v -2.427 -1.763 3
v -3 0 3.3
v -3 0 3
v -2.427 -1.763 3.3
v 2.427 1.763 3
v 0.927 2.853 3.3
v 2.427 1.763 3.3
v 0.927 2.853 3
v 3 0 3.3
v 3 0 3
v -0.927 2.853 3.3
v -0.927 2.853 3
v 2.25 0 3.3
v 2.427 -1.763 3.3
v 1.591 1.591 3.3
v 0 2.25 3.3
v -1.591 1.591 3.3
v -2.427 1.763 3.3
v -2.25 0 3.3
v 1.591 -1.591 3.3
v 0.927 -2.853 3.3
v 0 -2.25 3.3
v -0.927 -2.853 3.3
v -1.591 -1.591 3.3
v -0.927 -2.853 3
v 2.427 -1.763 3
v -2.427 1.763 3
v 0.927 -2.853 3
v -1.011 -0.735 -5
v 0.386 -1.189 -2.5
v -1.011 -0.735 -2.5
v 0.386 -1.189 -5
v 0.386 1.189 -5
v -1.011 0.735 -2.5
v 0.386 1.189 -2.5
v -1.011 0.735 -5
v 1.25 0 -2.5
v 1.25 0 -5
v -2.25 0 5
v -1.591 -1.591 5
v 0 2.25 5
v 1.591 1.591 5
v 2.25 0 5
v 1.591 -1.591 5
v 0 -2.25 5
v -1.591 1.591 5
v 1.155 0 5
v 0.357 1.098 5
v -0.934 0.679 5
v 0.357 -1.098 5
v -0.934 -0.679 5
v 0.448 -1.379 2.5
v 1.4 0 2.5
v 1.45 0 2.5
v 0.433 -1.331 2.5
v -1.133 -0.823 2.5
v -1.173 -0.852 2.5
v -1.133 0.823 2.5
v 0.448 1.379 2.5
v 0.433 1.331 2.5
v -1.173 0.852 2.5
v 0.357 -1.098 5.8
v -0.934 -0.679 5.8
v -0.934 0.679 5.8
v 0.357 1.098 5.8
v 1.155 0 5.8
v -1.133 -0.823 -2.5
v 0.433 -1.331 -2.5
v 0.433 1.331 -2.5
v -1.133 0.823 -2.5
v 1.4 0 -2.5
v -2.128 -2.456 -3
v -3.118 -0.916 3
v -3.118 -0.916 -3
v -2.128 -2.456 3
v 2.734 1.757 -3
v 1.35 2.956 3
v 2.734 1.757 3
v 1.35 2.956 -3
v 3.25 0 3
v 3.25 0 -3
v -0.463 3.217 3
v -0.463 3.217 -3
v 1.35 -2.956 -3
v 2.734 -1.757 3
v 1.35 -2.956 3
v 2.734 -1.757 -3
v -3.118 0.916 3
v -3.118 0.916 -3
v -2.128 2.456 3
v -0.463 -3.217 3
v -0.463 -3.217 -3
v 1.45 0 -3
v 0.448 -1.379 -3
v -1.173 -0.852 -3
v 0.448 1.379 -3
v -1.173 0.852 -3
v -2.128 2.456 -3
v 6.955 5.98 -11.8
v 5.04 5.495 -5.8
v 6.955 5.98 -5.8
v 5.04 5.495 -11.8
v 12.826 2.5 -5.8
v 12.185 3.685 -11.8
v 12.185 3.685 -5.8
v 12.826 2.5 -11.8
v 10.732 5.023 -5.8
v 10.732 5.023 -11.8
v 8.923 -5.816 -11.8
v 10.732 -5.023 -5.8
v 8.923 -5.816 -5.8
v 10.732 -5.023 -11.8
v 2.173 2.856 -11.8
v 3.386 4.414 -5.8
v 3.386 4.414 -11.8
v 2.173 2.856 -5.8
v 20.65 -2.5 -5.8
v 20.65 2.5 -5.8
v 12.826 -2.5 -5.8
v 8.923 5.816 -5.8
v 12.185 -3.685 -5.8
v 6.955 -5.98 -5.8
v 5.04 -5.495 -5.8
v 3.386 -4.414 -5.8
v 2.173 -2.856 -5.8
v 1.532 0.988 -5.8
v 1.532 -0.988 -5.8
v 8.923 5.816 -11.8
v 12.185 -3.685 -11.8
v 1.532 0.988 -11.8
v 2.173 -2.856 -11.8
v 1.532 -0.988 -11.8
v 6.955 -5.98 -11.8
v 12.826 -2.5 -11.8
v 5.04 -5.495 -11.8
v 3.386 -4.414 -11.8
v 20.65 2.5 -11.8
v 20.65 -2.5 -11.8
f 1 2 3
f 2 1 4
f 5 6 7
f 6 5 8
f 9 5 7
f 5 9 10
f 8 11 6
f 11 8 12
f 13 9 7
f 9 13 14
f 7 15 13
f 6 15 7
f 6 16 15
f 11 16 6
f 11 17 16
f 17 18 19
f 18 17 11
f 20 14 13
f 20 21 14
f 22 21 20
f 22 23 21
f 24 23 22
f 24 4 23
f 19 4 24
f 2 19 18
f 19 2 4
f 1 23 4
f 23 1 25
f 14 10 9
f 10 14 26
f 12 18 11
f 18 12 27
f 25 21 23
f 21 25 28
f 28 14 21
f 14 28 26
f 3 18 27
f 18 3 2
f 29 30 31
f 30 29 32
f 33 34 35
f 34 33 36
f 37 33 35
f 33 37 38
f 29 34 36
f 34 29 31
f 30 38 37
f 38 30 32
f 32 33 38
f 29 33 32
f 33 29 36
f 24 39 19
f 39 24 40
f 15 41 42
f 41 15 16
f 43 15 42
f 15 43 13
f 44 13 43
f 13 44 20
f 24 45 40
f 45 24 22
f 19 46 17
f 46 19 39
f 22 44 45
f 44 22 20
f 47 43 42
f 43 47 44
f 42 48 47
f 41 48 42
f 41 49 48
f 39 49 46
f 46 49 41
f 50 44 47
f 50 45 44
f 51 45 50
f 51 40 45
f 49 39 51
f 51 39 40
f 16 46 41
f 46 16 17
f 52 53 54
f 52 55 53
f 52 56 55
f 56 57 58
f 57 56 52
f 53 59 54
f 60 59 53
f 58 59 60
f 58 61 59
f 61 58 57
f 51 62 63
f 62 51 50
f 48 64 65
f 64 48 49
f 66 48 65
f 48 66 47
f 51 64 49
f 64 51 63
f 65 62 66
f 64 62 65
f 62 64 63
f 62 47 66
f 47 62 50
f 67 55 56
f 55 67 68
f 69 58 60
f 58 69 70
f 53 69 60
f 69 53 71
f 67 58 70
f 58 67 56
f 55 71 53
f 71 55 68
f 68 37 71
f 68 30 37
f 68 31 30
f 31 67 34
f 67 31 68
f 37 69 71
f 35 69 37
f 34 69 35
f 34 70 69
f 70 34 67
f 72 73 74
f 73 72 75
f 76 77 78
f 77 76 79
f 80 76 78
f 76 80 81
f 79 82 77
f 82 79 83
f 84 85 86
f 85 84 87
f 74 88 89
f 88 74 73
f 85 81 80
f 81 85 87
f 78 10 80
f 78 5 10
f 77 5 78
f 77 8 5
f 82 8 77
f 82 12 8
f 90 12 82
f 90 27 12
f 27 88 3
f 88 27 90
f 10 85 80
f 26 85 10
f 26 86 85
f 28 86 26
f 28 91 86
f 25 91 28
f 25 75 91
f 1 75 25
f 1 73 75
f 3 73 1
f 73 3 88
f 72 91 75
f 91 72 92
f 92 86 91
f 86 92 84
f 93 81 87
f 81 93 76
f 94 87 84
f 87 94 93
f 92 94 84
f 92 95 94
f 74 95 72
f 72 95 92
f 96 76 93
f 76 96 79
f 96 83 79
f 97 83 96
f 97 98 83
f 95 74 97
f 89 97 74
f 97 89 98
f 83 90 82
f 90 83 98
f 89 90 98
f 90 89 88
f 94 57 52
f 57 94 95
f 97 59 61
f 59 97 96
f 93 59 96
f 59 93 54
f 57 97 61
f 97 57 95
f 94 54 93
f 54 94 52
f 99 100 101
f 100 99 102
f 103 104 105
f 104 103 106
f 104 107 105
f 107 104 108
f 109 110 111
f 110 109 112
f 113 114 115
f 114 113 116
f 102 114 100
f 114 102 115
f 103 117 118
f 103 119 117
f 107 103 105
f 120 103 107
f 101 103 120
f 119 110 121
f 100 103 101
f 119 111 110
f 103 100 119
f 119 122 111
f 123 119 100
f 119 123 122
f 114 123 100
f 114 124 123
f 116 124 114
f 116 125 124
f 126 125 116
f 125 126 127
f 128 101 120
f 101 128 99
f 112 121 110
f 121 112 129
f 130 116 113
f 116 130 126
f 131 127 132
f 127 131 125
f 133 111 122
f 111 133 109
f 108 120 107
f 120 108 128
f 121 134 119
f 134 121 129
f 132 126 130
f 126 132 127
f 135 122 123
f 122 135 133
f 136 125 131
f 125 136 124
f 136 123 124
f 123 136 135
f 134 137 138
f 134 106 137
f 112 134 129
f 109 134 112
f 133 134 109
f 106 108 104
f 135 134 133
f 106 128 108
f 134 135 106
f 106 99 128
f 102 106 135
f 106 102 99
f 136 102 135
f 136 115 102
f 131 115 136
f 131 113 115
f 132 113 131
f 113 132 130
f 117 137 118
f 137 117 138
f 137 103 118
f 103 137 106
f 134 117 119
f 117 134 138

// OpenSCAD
// Parameters
shank_diameter_mm = 2.5; //[1.25:5:0.1]
length_mm = 10; //[5:20:0.5]
head_diameter_mm = 4.5; //[2.25:9:0.1]
head_height_mm = 2.5; //[1.25:5:0.1]
overlap_mm = 0.8; //[0.5:2:0.1]
threaded = 1; //[0:1:1]
thread_pitch_mm = 0.45; //[0.25:1:0.05]
thread_depth_mm = 0.15; //[0.05:0.4:0.01]
thread_length_mm = 7; //[3.5:14:0.5]
socket_across_flats_mm = 2; //[1:4:0.1]
socket_depth_mm = 1.5; //[0.75:3:0.1]
washer_outer_diameter_mm = 6; //[3:12:0.1]
washer_thickness_mm = 0.8; //[0.4:1.6:0.1]
washer_hole_diameter_mm = 2.8; //[1.4:5.6:0.1]
pcb_spacer_height_mm = 6; //[3:12:0.5]
pcb_spacer_wall_mm = 1.8; //[0.9:3.6:0.1]
pcb_spacer_clearance_diameter_mm = 2.9; //[1.5:6:0.1]
buzzer_diameter_mm = 12; //[6:24:0.5]
buzzer_height_mm = 6; //[3:12:0.5]
pin_socket_width_mm = 8; //[4:16:0.5]
pin_socket_depth_mm = 5; //[2.5:10:0.5]
pin_socket_height_mm = 6; //[3:12:0.5]

// PCB Spacer - complete geometry
module pcb_spacer() {
  color([0.85, 0.85, 0.8]) {
    difference() {
      cylinder(r=pcb_spacer_clearance_diameter_mm/2 + pcb_spacer_wall_mm, h=pcb_spacer_height_mm, center=true);
      translate([0, 0, -overlap_mm])
        cylinder(r=pcb_spacer_clearance_diameter_mm/2, h=pcb_spacer_height_mm + 2*overlap_mm, center=true);
    }
  }
}

// Screw and Washer - complete geometry
module screw_and_washer() {
  color("DimGray") {
    union() {
      // Screw Shank
      translate([0, 0, -head_height_mm/2])
        cylinder(r=shank_diameter_mm/2, h=length_mm - head_height_mm, center=true);
      // Cap Head
      translate([0, 0, length_mm/2 - head_height_mm/2])
        cylinder(r=head_diameter_mm/2, h=head_height_mm, center=true);
      // Hex Socket Recess
      translate([0, 0, length_mm/2 - socket_depth_mm/2 + overlap_mm])
        difference() {
          cylinder(r=(socket_across_flats_mm/2)/cos(30), h=socket_depth_mm, center=true);
        }
      // Thread Representation
      if (threaded) {
        translate([0, 0, -length_mm/2 + head_height_mm + thread_length_mm/2])
          cylinder(r=shank_diameter_mm/2 + thread_depth_mm, h=thread_length_mm, center=true);
      }
      // Washer
      translate([0, 0, length_mm/2 - head_height_mm - washer_thickness_mm/2 + overlap_mm])
        difference() {
          cylinder(r=washer_outer_diameter_mm/2, h=washer_thickness_mm, center=true);
          translate([0, 0, -overlap_mm])
            cylinder(r=washer_hole_diameter_mm/2, h=washer_thickness_mm + 2*overlap_mm, center=true);
        }
    }
  }
}

// Buzzer - complete geometry
module buzzer() {
  color([0.1, 0.1, 0.6]) {
    translate([head_diameter_mm/2 + buzzer_diameter_mm/2 - overlap_mm, 0, -length_mm/2 - pcb_spacer_height_mm + buzzer_height_mm/2 - overlap_mm])
      cylinder(r=buzzer_diameter_mm/2, h=buzzer_height_mm, center=true);
  }
}

// Pin Socket - complete geometry
module pin_socket() {
  color([0.2, 0.2, 0.2]) {
    translate([head_diameter_mm/2 + buzzer_diameter_mm + pin_socket_width_mm/2 - 2*overlap_mm, 0, -length_mm/2 - pcb_spacer_height_mm + pin_socket_height_mm/2 - overlap_mm])
      cube([pin_socket_width_mm, pin_socket_depth_mm, pin_socket_height_mm], center=true);
  }
}

// Assembly
module assembly() {
  screw_and_washer();
  pcb_spacer();
  buzzer();
  pin_socket();
}

assembly();
